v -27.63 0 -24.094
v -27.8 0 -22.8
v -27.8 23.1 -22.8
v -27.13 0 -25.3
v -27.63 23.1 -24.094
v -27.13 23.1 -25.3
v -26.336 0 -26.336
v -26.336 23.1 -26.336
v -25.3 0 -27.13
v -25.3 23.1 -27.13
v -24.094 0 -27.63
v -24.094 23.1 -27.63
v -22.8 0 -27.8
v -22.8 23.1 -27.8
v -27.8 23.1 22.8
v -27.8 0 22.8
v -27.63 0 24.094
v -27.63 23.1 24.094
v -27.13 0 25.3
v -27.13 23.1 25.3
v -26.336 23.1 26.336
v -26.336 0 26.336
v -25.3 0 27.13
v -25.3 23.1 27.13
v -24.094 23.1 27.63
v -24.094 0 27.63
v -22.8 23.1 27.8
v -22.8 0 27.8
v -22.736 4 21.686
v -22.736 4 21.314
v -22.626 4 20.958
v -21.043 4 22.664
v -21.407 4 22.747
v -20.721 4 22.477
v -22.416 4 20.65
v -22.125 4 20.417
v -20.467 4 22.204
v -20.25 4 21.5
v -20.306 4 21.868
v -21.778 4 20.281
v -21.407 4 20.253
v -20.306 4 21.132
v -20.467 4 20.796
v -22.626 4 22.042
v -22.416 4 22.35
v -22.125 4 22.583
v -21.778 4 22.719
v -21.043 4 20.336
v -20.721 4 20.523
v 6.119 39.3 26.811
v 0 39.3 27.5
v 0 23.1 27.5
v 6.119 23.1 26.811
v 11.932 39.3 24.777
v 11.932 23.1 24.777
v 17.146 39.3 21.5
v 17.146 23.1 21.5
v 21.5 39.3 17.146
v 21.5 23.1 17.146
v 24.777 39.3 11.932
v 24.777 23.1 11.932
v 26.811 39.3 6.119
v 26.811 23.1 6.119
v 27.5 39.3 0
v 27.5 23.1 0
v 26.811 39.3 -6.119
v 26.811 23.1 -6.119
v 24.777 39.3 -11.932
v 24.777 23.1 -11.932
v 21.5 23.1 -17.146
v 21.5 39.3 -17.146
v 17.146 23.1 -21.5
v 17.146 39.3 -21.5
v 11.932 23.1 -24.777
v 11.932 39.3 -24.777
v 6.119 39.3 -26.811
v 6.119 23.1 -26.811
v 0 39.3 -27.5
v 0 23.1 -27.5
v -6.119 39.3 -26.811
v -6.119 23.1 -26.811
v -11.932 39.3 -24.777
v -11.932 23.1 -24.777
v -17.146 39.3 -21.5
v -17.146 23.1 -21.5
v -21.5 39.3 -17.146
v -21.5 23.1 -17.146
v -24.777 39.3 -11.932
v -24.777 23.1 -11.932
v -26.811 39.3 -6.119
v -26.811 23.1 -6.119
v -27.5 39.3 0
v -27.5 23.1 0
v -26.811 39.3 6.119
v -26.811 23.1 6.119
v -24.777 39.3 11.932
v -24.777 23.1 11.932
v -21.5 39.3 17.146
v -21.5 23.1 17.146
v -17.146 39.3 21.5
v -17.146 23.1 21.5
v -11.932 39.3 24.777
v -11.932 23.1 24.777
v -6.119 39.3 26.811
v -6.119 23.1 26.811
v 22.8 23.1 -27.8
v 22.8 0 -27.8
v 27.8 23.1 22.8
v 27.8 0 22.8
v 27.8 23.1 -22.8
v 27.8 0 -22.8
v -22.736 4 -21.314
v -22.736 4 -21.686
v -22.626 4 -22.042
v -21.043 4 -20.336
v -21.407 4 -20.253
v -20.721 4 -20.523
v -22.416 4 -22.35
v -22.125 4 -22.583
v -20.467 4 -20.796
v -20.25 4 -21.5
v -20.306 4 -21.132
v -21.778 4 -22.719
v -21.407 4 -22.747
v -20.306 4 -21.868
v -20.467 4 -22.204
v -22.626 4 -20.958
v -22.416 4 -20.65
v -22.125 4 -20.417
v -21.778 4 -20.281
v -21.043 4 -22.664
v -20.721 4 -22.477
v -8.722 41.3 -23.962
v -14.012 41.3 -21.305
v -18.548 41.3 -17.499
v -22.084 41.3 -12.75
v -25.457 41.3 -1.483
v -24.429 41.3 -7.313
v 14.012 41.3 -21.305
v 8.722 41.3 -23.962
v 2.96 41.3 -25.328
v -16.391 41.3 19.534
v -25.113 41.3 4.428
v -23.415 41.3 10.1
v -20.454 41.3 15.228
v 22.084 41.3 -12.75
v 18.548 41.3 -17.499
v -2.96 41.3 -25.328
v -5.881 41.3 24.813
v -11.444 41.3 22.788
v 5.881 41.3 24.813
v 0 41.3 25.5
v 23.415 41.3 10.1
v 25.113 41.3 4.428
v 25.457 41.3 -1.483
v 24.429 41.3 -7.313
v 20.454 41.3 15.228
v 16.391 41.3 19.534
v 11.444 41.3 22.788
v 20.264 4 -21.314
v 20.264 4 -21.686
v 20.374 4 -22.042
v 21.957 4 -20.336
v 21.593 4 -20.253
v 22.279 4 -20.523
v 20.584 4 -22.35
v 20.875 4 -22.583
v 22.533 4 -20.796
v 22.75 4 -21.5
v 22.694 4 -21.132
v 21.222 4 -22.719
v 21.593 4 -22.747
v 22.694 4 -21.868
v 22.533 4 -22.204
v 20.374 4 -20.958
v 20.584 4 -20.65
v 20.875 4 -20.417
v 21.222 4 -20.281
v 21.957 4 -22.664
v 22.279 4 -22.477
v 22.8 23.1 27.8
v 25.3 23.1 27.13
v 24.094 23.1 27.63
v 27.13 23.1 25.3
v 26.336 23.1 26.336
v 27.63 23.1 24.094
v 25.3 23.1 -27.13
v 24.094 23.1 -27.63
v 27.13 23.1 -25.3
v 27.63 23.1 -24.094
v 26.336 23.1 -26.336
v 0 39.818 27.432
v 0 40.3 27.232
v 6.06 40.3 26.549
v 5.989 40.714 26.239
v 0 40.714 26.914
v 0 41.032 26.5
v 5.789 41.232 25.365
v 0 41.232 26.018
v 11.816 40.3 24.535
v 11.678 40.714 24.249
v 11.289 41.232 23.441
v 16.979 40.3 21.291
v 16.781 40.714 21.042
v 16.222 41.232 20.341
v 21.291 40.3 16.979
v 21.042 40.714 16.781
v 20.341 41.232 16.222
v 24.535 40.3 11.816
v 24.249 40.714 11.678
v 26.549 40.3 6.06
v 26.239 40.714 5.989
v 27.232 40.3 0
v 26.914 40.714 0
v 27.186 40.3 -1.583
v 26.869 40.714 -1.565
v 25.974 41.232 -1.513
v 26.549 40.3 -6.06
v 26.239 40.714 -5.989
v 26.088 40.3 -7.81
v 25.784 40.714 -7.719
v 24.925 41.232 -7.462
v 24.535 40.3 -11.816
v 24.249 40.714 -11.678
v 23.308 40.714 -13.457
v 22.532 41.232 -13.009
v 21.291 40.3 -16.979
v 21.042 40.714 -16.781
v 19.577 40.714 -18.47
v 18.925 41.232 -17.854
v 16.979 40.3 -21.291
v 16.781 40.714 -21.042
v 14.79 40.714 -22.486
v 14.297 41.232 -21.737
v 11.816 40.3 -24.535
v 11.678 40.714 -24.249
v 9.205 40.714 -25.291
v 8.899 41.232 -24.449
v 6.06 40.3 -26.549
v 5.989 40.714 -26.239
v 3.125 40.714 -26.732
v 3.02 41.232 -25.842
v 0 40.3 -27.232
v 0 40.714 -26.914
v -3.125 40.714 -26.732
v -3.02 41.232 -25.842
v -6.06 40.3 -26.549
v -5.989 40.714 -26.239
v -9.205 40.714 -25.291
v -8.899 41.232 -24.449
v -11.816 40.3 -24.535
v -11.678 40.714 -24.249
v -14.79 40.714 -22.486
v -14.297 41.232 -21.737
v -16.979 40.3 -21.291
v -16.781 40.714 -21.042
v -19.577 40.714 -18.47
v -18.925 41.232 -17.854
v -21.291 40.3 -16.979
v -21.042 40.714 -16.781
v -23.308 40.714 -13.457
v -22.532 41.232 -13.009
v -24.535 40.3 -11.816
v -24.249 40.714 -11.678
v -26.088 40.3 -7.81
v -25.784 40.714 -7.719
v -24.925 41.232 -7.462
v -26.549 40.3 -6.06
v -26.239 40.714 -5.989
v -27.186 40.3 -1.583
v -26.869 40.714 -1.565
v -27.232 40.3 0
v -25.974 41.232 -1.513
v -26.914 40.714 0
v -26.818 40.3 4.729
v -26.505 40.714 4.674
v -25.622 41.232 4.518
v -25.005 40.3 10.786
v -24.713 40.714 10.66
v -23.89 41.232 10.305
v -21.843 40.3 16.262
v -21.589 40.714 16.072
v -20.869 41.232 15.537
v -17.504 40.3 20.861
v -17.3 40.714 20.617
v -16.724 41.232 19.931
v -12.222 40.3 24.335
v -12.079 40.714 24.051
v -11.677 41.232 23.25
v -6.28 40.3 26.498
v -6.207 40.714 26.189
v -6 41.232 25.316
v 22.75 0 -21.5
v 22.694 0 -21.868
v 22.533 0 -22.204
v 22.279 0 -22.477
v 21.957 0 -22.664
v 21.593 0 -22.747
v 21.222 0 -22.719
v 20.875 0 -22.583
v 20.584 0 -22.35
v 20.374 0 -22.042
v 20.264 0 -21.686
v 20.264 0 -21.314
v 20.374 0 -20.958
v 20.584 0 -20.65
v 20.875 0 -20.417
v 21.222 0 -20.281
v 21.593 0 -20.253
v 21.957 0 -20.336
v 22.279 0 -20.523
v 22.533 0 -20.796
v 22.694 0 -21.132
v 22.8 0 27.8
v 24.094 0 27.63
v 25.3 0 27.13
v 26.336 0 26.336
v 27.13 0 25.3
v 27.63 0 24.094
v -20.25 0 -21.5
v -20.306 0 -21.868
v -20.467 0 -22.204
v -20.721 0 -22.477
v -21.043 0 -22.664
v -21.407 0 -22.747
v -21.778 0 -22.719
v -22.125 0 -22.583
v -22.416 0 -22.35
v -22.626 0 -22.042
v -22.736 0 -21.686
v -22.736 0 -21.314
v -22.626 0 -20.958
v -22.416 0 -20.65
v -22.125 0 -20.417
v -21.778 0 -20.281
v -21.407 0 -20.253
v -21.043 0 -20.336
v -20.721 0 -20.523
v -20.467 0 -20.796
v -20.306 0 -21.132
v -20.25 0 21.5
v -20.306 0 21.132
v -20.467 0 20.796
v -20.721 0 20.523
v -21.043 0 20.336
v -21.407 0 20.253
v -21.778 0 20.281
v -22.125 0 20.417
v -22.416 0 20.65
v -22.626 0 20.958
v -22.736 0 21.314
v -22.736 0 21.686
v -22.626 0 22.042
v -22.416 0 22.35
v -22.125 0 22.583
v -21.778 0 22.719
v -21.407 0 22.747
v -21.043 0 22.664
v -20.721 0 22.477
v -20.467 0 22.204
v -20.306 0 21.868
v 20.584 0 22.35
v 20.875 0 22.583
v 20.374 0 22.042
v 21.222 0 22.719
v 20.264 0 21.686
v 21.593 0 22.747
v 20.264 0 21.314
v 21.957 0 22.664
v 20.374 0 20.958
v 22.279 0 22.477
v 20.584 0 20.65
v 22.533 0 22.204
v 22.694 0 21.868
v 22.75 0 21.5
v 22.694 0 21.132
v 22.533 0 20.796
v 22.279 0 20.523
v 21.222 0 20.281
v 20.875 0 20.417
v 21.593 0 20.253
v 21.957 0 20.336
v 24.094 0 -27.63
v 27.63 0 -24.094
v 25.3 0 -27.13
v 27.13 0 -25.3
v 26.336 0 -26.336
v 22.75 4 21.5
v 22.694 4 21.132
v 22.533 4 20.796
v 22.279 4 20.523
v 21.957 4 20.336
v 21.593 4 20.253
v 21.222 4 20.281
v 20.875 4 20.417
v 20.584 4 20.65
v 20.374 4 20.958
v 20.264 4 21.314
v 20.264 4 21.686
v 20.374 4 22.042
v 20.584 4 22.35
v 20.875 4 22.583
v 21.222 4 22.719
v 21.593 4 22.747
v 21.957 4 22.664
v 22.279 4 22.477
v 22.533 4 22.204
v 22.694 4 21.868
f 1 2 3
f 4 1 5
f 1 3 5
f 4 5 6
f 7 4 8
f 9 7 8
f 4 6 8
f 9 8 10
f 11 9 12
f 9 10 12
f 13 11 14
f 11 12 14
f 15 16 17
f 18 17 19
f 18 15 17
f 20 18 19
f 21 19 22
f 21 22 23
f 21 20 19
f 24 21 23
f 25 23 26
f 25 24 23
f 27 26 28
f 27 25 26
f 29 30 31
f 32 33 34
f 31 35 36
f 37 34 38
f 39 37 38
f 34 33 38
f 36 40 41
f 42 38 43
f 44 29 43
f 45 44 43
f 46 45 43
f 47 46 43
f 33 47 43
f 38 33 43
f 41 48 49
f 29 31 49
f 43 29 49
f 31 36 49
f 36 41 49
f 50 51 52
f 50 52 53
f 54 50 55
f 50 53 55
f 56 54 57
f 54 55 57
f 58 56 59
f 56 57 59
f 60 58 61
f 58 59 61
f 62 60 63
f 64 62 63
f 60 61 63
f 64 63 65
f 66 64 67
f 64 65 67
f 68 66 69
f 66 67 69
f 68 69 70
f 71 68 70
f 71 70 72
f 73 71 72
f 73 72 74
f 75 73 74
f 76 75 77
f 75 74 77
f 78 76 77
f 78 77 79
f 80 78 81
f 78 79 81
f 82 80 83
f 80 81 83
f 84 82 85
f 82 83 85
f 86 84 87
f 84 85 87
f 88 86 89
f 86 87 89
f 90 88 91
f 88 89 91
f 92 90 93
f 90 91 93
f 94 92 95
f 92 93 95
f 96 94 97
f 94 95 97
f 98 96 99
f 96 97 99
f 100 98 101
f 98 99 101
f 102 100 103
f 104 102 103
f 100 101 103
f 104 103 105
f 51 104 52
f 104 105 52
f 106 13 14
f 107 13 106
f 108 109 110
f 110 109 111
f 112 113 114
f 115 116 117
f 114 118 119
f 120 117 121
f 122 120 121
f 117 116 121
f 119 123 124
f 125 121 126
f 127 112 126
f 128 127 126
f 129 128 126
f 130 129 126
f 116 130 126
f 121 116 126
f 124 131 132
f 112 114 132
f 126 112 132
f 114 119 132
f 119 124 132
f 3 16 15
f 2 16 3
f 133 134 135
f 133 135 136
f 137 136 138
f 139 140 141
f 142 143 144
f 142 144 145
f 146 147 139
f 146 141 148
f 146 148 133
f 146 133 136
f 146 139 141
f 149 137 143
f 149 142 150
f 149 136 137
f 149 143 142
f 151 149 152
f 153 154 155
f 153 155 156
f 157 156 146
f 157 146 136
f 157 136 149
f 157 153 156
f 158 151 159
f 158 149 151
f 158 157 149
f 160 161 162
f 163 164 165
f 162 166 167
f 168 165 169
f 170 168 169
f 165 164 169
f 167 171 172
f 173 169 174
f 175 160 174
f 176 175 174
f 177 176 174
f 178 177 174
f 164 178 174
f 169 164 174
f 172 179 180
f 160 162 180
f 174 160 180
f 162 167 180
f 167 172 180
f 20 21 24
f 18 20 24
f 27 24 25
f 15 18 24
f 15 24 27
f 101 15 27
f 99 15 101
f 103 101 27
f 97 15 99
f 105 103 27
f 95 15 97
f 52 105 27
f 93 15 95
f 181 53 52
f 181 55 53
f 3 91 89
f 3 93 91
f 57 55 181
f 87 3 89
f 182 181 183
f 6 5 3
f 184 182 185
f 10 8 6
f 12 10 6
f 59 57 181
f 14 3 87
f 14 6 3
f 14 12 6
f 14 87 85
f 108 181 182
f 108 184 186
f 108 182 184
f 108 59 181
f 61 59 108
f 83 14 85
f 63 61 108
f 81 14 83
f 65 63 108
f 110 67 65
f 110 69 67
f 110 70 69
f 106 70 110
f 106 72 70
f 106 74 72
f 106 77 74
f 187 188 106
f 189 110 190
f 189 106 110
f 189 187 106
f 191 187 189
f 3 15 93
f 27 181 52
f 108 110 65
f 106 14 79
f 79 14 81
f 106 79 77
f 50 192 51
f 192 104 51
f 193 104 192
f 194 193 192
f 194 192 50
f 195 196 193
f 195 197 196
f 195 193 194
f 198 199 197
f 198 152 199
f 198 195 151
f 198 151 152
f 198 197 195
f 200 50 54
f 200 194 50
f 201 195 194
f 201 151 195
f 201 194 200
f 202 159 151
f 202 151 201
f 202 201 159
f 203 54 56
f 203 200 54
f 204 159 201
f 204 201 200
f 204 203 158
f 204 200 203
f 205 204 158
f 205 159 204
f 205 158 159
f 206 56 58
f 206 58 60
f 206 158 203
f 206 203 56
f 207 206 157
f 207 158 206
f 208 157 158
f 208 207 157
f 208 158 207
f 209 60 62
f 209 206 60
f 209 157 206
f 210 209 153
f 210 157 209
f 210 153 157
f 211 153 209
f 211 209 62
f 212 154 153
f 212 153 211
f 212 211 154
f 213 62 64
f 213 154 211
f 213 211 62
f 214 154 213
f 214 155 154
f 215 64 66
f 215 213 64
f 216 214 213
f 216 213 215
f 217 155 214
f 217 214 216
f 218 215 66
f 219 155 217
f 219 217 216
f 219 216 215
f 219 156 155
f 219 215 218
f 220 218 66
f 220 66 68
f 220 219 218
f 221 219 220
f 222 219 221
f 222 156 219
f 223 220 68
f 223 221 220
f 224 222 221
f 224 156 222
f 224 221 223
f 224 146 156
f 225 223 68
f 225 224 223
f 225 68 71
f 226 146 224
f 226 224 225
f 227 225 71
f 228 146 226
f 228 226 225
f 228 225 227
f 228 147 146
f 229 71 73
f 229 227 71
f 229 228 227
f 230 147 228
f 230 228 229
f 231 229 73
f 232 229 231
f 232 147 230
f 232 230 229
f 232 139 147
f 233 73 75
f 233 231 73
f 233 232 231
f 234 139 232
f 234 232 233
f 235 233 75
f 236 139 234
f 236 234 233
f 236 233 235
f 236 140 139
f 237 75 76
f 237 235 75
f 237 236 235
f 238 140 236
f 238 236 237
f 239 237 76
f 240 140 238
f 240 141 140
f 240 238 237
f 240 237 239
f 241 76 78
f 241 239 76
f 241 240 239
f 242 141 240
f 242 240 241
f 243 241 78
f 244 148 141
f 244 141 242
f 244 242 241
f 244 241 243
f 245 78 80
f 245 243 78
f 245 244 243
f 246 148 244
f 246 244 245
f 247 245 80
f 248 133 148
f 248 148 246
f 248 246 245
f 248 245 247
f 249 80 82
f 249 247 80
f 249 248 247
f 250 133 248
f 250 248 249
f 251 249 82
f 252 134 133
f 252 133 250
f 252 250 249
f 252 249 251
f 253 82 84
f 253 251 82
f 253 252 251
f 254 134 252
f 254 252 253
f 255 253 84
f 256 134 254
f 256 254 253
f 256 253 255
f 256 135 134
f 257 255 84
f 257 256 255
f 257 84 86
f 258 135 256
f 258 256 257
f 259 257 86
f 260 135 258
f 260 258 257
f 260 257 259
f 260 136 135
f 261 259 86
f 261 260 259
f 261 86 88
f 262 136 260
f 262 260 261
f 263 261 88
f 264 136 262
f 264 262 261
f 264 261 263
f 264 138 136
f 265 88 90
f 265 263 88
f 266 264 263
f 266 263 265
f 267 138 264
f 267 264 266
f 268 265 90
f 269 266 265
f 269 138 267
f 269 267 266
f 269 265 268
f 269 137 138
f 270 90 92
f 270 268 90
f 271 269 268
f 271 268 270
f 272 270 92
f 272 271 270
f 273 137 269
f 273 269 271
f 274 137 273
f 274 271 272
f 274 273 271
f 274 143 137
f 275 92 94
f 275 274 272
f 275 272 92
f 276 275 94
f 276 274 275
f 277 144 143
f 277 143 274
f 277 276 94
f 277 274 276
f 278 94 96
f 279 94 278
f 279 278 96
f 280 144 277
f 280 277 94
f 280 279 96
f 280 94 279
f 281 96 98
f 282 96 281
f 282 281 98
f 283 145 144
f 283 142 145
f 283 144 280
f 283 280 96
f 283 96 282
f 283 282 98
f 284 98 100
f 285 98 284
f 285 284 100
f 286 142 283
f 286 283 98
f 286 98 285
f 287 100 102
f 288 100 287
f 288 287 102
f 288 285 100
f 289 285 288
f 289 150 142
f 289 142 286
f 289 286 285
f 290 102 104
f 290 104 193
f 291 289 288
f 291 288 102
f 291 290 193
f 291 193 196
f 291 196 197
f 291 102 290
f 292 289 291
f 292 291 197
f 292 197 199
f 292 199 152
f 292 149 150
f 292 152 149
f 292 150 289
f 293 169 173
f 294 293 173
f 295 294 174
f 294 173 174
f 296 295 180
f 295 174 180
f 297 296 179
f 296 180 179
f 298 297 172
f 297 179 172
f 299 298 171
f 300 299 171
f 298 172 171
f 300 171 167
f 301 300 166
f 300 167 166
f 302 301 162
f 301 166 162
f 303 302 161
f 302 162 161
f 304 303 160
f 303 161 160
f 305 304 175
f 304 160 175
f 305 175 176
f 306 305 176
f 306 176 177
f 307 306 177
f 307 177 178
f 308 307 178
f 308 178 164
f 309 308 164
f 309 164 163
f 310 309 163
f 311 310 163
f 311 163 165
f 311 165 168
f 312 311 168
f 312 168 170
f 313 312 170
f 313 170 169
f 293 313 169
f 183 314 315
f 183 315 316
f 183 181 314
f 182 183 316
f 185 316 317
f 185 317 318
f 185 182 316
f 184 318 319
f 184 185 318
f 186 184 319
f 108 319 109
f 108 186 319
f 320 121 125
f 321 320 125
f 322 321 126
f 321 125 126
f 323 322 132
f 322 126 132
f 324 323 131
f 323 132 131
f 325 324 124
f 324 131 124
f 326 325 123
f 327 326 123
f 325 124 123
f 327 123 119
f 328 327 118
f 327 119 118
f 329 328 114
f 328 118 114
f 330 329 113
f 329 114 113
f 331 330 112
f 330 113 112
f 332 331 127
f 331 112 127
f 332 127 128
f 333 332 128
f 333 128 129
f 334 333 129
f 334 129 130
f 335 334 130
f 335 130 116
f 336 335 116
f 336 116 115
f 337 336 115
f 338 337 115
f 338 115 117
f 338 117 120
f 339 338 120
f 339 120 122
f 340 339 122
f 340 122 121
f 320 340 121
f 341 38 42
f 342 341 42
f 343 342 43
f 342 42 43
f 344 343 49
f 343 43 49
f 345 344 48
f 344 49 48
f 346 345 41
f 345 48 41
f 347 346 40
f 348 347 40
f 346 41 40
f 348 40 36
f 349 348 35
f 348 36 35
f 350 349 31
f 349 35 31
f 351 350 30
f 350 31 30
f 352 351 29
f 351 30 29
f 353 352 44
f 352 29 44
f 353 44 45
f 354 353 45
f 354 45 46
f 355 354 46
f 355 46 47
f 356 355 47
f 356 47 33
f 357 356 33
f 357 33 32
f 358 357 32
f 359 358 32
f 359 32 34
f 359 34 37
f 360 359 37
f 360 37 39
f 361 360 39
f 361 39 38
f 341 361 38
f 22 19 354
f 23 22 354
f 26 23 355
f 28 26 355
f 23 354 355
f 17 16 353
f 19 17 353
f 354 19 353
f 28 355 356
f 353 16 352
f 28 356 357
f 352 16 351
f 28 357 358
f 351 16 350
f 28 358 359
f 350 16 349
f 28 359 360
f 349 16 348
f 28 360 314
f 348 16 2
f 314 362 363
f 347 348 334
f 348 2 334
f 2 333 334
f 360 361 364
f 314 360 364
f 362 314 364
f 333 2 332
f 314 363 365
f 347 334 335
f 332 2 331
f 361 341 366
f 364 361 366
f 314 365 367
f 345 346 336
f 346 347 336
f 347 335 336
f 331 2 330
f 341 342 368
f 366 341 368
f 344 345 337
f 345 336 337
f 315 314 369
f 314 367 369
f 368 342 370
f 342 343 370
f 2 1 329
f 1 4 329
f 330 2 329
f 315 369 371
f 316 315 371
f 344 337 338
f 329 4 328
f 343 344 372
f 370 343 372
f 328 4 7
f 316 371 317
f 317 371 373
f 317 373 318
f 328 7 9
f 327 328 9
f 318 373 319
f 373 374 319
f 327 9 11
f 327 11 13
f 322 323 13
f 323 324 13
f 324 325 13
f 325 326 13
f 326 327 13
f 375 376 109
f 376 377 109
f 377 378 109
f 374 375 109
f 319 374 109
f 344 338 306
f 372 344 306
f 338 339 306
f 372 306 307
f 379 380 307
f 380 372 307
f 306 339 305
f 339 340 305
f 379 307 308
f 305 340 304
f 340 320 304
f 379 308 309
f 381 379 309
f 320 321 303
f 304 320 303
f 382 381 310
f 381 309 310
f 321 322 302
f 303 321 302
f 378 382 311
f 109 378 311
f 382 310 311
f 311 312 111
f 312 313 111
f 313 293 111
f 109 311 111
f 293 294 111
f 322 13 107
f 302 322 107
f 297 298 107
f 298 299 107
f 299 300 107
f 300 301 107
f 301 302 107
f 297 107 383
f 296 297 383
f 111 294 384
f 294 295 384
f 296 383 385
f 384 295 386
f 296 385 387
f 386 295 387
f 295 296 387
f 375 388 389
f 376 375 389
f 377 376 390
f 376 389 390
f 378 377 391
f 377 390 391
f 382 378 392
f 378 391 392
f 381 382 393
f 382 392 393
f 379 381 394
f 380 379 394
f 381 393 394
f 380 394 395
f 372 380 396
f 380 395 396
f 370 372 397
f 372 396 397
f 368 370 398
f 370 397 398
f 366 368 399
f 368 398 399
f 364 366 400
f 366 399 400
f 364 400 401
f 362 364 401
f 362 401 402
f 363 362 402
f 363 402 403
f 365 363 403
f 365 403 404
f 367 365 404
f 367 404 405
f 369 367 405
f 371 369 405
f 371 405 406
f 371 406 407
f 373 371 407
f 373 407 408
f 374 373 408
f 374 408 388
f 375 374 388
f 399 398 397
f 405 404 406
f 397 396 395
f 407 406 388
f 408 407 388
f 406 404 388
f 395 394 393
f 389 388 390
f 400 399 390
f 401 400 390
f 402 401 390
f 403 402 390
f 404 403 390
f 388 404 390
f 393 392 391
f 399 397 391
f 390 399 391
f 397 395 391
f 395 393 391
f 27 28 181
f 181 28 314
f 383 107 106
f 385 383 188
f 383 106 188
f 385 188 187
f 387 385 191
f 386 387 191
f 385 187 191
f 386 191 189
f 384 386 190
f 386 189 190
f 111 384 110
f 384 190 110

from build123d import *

# Parameters (mm, degrees)
SKETCH_2_W          = 55.6
SKETCH_2_H          = 55.6
EXTRUDE_1_DEPTH     = 23.1
SKETCH_3_R          = 27.5
EXTRUDE_2_DEPTH     = 18.2
HOLE_WIZARD_1_D     = 2.5
HOLE_WIZARD_1_DEPTH = 4
FILLET_1_R          = 5
FILLET_2_R          = 2


with BuildPart() as part:
    # 草图2 → 凸台-拉伸1 (new body)
    with BuildSketch(Plane(origin=(0, 0, 0), x_dir=(1, 0, 0), z_dir=(0, 1, 0))):
        Rectangle(SKETCH_2_W, SKETCH_2_H)
    extrude(amount=EXTRUDE_1_DEPTH)

    # 草图3 → 凸台-拉伸2 (add)
    with BuildSketch(Plane(origin=(0, 23.1, 0), x_dir=(1, 0, 0), z_dir=(0, 1, 0))):
        with Locations(Location((0, 0, 0), (0, 0, 270))):
            Circle(SKETCH_3_R)
    extrude(amount=EXTRUDE_2_DEPTH)

    # 孔1
    with Locations(Plane(origin=(0, 0, 0), x_dir=(-1, 0, 0), z_dir=(0, -1, 0))):
        with Locations((-21.5, 21.5), (21.5, 21.5), (21.5, -21.5), (-21.5, -21.5)):
            Hole(HOLE_WIZARD_1_D / 2, depth=HOLE_WIZARD_1_DEPTH)

    # 圆角1
    fillet_1_edges = [part.edges().sort_by_distance(p)[0] for p in [
        (27.8, 11.55, 27.8),
        (-27.8, 11.55, 27.8),
        (-27.8, 11.55, -27.8),
        (27.8, 11.55, -27.8),
    ]]
    fillet(fillet_1_edges, radius=FILLET_1_R)

    # 圆角2
    fillet_2_edges = [part.edges().sort_by_distance(p)[0] for p in [
        (0, 41.3, -27.5),
    ]]
    fillet(fillet_2_edges, radius=FILLET_2_R)


solid = part.part
